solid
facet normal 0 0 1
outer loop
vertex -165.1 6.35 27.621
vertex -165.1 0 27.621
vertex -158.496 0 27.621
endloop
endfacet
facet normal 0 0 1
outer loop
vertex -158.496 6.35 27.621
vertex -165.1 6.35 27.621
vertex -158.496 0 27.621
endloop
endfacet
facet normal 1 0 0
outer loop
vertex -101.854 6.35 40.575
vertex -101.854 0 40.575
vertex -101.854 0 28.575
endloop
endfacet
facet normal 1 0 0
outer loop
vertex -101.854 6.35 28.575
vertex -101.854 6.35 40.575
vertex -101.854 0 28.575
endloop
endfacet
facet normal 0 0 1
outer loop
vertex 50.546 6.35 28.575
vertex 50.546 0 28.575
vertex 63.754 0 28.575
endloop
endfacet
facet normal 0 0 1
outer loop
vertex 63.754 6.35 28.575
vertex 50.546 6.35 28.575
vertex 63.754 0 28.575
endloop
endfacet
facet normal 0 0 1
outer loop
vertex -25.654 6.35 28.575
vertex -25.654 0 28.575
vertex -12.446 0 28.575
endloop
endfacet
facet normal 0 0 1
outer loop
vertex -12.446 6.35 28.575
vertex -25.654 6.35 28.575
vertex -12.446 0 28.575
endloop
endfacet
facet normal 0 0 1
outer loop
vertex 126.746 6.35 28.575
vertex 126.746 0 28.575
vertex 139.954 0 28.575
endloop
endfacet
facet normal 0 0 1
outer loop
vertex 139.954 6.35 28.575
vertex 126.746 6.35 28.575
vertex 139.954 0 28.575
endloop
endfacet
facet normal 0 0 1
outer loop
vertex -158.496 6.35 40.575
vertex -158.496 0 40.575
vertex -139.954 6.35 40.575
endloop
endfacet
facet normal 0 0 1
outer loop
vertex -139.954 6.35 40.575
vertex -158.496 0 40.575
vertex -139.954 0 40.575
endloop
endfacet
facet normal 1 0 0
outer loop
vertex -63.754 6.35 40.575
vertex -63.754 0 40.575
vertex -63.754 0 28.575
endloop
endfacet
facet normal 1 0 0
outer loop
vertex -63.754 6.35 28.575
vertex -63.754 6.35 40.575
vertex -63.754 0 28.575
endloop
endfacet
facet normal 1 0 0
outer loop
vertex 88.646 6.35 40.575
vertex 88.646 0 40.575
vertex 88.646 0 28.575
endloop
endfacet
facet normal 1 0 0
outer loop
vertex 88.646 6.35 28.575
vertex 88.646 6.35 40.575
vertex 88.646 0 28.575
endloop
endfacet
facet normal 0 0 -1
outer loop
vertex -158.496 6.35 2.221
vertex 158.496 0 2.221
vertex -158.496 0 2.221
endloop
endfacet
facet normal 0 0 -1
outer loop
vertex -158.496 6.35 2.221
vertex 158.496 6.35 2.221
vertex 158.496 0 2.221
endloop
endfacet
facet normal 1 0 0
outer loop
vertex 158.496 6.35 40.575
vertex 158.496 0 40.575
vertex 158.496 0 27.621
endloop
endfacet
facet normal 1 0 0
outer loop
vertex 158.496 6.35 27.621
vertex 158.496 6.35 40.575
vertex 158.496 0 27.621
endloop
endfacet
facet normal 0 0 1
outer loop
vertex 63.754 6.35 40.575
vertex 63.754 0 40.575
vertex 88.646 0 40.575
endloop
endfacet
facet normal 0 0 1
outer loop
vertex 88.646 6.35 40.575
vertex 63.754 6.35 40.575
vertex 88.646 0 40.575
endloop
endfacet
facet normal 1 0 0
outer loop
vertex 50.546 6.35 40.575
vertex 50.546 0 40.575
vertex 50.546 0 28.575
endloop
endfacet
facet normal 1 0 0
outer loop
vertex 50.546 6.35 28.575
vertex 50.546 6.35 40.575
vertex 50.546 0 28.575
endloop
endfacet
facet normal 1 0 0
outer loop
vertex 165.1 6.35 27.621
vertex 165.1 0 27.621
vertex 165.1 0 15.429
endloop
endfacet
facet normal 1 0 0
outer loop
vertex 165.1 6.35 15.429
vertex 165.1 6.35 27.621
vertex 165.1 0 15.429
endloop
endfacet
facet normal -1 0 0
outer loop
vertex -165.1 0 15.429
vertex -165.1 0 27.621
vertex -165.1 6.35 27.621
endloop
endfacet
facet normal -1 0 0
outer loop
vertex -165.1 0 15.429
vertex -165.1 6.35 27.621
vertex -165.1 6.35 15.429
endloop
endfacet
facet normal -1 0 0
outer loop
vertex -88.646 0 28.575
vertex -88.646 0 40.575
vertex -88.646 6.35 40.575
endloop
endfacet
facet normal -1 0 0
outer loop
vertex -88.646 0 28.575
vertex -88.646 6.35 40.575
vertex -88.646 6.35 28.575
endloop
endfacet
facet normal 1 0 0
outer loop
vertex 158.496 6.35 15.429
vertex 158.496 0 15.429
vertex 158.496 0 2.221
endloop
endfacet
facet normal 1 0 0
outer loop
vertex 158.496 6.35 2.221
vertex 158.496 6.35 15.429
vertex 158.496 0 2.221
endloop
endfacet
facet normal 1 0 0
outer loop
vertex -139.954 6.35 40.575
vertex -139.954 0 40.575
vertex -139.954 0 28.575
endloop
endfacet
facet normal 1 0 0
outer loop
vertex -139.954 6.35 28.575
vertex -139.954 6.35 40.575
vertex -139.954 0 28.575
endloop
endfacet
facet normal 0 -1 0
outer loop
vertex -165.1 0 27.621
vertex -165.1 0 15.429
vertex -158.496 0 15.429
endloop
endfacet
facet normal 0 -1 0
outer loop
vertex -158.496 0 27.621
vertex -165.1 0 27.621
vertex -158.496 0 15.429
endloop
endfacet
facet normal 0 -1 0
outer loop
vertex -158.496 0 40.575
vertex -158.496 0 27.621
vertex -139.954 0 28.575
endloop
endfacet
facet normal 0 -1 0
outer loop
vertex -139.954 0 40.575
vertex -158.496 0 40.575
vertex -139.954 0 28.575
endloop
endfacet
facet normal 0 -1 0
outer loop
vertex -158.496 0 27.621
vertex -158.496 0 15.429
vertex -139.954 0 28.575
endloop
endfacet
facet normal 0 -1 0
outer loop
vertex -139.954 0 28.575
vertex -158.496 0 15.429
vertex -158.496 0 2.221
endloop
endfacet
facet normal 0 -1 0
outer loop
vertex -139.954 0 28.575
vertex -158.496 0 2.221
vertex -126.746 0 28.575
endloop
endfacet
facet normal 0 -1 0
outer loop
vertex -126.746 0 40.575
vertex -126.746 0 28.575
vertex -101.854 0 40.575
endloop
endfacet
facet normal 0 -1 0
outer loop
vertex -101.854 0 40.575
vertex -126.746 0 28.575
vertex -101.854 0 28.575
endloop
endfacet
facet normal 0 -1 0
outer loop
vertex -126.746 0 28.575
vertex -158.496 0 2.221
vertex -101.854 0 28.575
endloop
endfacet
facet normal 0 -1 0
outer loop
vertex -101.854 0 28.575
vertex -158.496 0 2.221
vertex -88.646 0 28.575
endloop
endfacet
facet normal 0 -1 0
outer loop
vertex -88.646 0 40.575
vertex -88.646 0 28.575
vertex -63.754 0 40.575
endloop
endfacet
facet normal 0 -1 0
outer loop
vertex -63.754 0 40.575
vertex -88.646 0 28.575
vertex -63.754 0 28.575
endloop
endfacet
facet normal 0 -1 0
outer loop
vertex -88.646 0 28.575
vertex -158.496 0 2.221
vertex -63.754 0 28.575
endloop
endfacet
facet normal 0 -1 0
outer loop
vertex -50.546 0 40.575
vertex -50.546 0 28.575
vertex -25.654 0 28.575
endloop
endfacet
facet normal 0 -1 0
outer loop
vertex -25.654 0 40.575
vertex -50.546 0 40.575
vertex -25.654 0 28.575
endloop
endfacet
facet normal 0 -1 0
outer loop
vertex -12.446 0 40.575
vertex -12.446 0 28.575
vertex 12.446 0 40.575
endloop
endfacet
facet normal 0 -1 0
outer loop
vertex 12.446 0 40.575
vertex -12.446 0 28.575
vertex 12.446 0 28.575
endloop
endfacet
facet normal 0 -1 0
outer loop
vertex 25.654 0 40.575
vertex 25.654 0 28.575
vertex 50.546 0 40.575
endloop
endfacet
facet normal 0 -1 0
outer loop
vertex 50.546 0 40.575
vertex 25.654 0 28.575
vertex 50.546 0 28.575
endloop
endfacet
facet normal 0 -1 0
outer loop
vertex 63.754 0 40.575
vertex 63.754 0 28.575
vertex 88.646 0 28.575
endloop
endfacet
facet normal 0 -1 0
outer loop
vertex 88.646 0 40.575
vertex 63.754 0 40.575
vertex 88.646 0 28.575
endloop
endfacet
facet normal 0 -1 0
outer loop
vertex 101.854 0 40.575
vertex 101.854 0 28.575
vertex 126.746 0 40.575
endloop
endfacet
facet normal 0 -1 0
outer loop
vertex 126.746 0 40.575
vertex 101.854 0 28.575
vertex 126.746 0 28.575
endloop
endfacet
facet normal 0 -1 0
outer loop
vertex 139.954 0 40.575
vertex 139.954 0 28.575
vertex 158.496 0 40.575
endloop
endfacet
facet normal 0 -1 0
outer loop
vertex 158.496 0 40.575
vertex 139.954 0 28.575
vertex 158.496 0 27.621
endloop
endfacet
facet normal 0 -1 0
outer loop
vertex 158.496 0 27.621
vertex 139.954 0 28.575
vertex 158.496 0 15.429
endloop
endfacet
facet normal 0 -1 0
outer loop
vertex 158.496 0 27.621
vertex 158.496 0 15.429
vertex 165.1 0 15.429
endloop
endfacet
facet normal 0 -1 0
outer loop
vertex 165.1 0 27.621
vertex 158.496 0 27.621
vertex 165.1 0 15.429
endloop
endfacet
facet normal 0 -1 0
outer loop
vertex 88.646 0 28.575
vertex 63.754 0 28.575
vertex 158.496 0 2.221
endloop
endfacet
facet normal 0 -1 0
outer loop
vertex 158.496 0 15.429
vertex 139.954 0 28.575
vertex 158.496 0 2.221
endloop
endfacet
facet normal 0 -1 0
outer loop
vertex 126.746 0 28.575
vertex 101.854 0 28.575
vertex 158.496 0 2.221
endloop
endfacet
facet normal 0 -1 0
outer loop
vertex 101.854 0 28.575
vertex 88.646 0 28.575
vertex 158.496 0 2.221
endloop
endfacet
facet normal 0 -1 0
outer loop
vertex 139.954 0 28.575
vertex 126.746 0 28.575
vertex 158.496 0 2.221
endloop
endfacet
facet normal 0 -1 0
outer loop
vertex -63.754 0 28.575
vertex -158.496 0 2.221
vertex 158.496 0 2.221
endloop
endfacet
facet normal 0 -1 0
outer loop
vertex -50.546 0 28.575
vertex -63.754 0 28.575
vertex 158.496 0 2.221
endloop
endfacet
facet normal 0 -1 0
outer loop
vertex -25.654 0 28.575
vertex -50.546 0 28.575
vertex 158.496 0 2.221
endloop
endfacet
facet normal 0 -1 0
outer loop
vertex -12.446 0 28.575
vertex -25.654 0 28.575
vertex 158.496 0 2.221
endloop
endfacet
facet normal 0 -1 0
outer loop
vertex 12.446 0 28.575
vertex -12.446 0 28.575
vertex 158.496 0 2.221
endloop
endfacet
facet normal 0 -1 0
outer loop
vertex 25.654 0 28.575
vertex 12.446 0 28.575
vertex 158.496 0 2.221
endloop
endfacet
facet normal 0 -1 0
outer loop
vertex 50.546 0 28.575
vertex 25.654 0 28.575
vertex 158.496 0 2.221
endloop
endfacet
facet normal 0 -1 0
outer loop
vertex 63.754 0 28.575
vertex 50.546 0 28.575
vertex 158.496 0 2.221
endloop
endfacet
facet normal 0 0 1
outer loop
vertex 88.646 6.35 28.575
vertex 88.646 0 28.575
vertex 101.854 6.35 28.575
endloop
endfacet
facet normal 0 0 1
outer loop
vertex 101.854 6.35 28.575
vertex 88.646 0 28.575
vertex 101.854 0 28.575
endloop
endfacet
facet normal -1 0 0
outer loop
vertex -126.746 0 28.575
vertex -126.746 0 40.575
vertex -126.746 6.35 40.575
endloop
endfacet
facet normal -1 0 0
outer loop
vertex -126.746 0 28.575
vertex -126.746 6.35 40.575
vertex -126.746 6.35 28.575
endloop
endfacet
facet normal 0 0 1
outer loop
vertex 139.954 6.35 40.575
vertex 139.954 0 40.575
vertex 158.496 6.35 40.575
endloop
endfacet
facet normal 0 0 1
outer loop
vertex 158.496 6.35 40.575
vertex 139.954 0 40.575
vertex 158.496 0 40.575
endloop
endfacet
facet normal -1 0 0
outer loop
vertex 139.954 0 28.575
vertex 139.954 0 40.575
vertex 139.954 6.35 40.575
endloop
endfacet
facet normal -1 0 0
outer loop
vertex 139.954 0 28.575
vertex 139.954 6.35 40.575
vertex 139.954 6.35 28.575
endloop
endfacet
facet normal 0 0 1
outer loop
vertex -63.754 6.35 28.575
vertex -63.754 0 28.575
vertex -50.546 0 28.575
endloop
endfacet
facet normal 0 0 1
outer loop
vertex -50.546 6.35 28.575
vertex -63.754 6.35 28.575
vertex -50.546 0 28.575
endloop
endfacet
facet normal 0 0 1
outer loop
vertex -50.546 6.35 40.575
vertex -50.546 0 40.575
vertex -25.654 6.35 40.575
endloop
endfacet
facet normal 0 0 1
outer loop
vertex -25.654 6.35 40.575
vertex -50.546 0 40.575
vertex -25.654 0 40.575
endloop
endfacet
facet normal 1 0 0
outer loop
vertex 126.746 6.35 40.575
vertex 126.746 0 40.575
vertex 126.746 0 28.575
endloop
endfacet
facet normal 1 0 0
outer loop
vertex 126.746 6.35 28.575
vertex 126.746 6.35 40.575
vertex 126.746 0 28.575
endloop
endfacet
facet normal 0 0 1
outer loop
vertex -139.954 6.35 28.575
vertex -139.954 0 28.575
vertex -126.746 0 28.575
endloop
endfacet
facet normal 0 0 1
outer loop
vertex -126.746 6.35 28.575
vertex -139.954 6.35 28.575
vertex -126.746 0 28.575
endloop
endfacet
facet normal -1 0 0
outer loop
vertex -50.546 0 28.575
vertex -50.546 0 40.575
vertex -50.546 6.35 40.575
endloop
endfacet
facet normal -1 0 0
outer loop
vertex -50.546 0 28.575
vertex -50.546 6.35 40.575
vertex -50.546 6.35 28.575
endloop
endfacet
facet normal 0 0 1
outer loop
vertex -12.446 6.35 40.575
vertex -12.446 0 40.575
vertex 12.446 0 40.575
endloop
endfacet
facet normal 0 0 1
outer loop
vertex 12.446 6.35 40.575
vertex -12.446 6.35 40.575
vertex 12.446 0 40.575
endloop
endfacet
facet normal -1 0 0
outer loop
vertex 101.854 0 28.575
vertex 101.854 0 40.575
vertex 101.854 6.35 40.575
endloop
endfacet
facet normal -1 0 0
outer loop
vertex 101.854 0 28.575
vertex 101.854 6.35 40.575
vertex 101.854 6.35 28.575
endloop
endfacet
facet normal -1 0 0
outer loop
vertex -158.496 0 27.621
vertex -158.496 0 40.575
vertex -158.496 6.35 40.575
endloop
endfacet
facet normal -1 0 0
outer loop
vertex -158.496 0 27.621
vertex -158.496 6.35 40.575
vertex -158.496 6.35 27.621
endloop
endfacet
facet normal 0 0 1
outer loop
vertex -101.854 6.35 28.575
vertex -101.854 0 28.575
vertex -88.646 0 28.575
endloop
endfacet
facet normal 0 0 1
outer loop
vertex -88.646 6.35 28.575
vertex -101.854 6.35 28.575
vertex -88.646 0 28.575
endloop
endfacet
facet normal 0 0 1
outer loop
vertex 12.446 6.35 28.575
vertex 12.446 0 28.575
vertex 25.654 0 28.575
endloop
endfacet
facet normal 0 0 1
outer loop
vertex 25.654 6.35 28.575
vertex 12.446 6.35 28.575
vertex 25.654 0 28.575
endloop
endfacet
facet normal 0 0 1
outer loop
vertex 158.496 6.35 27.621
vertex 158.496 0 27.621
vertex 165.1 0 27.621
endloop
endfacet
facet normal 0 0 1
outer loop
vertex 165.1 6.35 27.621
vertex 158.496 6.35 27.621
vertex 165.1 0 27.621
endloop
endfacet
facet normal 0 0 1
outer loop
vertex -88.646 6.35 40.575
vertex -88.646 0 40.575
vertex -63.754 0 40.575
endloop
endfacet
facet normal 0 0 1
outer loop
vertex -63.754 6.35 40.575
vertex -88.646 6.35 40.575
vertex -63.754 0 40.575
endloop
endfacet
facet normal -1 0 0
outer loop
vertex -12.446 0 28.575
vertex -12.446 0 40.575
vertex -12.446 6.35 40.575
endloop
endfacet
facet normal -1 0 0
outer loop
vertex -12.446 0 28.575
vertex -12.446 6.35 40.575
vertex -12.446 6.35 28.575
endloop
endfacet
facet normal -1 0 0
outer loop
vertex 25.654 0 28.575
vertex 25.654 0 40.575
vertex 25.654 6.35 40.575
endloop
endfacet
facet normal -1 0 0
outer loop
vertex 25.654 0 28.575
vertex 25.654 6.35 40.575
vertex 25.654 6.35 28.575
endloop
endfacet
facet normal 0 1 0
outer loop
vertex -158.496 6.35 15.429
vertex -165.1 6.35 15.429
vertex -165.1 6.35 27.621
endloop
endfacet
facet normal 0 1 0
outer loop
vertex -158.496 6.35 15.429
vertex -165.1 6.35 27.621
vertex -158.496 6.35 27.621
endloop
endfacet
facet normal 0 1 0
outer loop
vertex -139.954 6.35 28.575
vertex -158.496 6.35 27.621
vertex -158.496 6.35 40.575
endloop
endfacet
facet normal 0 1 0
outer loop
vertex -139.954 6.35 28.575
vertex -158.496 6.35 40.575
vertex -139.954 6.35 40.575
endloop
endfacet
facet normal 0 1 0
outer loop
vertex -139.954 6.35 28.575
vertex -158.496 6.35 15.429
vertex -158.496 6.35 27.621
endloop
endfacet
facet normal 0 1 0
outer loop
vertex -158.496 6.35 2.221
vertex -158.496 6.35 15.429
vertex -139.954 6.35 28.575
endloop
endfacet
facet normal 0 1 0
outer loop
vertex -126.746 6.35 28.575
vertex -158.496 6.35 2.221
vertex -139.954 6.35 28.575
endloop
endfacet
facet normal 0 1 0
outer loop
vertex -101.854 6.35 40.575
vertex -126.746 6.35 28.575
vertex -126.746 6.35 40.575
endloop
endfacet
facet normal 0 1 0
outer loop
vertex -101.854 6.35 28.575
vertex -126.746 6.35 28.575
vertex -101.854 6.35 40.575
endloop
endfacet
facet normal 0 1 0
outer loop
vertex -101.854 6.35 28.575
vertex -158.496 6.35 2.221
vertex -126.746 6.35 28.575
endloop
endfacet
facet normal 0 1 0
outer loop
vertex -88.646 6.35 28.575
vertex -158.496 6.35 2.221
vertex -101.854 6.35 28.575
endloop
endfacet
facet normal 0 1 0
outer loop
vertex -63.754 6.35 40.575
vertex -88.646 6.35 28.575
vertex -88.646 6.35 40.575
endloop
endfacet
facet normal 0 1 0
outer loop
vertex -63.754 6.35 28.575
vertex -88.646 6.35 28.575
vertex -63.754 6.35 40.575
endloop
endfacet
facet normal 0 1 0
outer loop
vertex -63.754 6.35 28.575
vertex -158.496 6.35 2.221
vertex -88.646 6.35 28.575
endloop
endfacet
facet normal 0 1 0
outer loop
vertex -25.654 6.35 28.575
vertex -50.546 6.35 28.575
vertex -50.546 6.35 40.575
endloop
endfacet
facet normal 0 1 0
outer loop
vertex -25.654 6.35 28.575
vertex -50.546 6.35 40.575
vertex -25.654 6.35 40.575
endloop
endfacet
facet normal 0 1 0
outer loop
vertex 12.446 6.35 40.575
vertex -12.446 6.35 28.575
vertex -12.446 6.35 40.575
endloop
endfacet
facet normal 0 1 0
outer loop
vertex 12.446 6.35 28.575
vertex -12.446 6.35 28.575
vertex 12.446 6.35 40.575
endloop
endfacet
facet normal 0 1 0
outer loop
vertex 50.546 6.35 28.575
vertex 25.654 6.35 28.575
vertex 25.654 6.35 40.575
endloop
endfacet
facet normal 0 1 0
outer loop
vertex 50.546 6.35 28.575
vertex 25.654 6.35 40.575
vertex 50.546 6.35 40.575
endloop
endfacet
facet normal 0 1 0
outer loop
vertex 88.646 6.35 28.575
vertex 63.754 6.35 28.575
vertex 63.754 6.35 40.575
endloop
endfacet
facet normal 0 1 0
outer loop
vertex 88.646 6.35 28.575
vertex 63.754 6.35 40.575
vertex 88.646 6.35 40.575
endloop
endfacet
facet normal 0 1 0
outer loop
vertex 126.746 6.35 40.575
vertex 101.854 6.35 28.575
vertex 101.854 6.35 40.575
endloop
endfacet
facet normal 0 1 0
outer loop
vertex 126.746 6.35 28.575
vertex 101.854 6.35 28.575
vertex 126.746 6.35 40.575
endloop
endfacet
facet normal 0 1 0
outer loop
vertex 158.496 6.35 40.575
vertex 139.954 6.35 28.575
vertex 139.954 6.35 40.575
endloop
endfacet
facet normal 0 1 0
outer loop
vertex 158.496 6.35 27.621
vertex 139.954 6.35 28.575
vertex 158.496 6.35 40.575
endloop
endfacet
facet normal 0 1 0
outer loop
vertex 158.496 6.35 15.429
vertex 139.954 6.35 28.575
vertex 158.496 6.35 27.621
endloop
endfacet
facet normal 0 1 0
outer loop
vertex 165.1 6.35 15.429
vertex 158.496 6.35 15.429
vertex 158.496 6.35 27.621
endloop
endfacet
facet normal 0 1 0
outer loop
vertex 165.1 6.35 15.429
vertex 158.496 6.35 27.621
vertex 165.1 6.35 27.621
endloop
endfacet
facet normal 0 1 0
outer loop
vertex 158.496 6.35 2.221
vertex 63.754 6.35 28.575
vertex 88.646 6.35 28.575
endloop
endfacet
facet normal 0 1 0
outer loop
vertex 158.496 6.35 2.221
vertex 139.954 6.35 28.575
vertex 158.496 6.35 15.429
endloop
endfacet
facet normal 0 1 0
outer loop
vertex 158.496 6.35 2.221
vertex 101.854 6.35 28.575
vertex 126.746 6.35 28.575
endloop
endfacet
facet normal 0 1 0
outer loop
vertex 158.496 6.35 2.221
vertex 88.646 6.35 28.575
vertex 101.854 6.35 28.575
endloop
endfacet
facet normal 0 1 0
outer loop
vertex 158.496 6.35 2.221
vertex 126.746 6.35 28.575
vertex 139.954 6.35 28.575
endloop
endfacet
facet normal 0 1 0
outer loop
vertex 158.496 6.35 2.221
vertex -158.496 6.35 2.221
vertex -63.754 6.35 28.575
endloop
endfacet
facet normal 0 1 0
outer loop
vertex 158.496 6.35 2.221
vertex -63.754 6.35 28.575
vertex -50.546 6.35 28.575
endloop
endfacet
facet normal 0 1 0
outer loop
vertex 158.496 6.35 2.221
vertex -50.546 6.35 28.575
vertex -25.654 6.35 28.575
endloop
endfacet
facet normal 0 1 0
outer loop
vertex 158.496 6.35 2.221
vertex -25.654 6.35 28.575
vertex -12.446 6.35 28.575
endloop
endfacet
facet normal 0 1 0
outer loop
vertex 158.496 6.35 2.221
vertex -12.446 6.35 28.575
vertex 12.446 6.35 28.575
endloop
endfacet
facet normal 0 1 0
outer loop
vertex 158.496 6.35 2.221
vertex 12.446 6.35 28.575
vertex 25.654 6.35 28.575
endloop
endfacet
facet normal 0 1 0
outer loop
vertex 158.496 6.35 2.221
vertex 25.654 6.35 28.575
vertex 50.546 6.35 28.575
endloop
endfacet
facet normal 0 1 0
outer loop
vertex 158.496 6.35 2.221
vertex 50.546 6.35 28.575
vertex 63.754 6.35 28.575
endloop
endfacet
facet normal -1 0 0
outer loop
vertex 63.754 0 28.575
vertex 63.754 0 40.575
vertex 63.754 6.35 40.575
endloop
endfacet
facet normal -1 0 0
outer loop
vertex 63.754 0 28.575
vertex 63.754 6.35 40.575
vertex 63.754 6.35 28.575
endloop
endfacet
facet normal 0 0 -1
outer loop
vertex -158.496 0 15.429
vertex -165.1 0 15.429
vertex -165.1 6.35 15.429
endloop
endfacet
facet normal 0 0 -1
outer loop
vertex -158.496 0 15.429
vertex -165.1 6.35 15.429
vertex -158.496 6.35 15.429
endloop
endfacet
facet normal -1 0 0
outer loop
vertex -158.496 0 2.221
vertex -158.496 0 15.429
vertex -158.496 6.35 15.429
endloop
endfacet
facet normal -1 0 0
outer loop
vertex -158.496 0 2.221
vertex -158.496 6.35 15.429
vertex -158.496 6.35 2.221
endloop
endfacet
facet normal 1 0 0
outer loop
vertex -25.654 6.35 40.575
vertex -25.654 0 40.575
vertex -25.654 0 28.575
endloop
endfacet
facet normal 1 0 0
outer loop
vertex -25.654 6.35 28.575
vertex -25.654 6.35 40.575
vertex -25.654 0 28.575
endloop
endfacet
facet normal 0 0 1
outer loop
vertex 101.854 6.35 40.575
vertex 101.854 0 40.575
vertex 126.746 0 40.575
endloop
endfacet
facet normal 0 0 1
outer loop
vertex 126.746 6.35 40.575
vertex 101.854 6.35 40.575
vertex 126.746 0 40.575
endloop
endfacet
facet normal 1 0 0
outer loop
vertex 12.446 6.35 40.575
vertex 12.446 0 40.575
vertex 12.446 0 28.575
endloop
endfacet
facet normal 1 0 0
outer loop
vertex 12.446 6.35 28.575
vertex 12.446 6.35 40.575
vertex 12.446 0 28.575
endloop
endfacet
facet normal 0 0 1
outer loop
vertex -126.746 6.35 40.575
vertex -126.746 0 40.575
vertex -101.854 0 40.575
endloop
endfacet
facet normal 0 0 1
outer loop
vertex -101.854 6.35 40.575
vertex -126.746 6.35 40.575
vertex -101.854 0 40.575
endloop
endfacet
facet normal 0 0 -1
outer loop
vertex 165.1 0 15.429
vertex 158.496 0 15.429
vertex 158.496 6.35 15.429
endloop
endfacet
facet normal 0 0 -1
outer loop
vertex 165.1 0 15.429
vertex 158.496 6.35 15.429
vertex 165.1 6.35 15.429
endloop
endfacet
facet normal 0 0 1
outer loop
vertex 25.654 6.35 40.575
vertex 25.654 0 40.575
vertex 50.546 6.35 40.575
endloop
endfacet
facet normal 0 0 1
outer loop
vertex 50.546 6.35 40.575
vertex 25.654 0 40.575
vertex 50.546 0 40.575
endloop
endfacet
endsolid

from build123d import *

# Parameters (mm, degrees)
SKETCH1_W           = 330.2
SKETCH1_H           = 57.15
BOSS_EXTRUDE1_DEPTH = 6.35
SKETCH3_W           = 24.892
SKETCH3_H           = 12
BOSS_EXTRUDE2_DEPTH = 6.35
SKETCH4_W           = 13.208
SKETCH4_H           = 13.208
CUT_EXTRUDE2_DEPTH  = 171.131311419
SKETCH5_W           = 365.344823274
SKETCH5_H           = 36.987593387
CUT_EXTRUDE3_DEPTH  = 30.796


with BuildPart() as part:
    # Sketch1 → Boss-Extrude1 (new body)
    with BuildSketch(Plane(origin=(0, 0, 0), x_dir=(1, 0, 0), z_dir=(0, 1, 0))):
        Rectangle(SKETCH1_W, SKETCH1_H)
    extrude(amount=BOSS_EXTRUDE1_DEPTH)

    # Sketch3 → Boss-Extrude2 (add)
    with BuildSketch(Plane(origin=(0, 0, 0), x_dir=(1, 0, 0), z_dir=(0, 1, 0))):
        with Locations((-114.3, -34.575)):
            Rectangle(SKETCH3_W, SKETCH3_H)
        with Locations((-76.2, -34.575)):
            Rectangle(SKETCH3_W, SKETCH3_H)
        with Locations((-38.1, -34.575)):
            Rectangle(SKETCH3_W, SKETCH3_H)
        with Locations((0, -34.575)):
            Rectangle(SKETCH3_W, SKETCH3_H)
        with Locations((38.1, -34.575)):
            Rectangle(SKETCH3_W, SKETCH3_H)
        with Locations((76.2, -34.575)):
            Rectangle(SKETCH3_W, SKETCH3_H)
        with Locations((114.3, -34.575)):
            Rectangle(SKETCH3_W, SKETCH3_H)
        with Locations((152.4, -34.575)):
            Rectangle(SKETCH3_W, SKETCH3_H)
        with Locations((-152.4, -34.575)):
            Rectangle(SKETCH3_W, SKETCH3_H)
    extrude(amount=BOSS_EXTRUDE2_DEPTH)

    # Sketch4 → Cut-Extrude2 (cut, through all)
    with BuildSketch(Plane(origin=(0, 0, 0), x_dir=(1, 0, 0), z_dir=(0, 1, 0))):
        with Locations((165.1, 16.575)):
            Rectangle(SKETCH4_W, SKETCH4_H)
        with Locations((-165.1, -34.225)):
            Rectangle(SKETCH4_W, SKETCH4_H)
        with Locations((165.1, -8.825)):
            Rectangle(SKETCH4_W, SKETCH4_H)
        with Locations((165.1, -34.225)):
            Rectangle(SKETCH4_W, SKETCH4_H)
        with Locations((-165.1, -8.825)):
            Rectangle(SKETCH4_W, SKETCH4_H)
        with Locations((-165.1, 16.575)):
            Rectangle(SKETCH4_W, SKETCH4_H)
    extrude(amount=CUT_EXTRUDE2_DEPTH, mode=Mode.SUBTRACT)

    # Sketch5 → Cut-Extrude3 (cut)
    with BuildSketch(Plane(origin=(0, 0, -28.575), x_dir=(-1, 0, 0), z_dir=(0, 0, -1))):
        with Locations((-4.838573854, 1.285089719)):
            Rectangle(SKETCH5_W, SKETCH5_H)
    extrude(amount=-CUT_EXTRUDE3_DEPTH, mode=Mode.SUBTRACT)


solid = part.part
